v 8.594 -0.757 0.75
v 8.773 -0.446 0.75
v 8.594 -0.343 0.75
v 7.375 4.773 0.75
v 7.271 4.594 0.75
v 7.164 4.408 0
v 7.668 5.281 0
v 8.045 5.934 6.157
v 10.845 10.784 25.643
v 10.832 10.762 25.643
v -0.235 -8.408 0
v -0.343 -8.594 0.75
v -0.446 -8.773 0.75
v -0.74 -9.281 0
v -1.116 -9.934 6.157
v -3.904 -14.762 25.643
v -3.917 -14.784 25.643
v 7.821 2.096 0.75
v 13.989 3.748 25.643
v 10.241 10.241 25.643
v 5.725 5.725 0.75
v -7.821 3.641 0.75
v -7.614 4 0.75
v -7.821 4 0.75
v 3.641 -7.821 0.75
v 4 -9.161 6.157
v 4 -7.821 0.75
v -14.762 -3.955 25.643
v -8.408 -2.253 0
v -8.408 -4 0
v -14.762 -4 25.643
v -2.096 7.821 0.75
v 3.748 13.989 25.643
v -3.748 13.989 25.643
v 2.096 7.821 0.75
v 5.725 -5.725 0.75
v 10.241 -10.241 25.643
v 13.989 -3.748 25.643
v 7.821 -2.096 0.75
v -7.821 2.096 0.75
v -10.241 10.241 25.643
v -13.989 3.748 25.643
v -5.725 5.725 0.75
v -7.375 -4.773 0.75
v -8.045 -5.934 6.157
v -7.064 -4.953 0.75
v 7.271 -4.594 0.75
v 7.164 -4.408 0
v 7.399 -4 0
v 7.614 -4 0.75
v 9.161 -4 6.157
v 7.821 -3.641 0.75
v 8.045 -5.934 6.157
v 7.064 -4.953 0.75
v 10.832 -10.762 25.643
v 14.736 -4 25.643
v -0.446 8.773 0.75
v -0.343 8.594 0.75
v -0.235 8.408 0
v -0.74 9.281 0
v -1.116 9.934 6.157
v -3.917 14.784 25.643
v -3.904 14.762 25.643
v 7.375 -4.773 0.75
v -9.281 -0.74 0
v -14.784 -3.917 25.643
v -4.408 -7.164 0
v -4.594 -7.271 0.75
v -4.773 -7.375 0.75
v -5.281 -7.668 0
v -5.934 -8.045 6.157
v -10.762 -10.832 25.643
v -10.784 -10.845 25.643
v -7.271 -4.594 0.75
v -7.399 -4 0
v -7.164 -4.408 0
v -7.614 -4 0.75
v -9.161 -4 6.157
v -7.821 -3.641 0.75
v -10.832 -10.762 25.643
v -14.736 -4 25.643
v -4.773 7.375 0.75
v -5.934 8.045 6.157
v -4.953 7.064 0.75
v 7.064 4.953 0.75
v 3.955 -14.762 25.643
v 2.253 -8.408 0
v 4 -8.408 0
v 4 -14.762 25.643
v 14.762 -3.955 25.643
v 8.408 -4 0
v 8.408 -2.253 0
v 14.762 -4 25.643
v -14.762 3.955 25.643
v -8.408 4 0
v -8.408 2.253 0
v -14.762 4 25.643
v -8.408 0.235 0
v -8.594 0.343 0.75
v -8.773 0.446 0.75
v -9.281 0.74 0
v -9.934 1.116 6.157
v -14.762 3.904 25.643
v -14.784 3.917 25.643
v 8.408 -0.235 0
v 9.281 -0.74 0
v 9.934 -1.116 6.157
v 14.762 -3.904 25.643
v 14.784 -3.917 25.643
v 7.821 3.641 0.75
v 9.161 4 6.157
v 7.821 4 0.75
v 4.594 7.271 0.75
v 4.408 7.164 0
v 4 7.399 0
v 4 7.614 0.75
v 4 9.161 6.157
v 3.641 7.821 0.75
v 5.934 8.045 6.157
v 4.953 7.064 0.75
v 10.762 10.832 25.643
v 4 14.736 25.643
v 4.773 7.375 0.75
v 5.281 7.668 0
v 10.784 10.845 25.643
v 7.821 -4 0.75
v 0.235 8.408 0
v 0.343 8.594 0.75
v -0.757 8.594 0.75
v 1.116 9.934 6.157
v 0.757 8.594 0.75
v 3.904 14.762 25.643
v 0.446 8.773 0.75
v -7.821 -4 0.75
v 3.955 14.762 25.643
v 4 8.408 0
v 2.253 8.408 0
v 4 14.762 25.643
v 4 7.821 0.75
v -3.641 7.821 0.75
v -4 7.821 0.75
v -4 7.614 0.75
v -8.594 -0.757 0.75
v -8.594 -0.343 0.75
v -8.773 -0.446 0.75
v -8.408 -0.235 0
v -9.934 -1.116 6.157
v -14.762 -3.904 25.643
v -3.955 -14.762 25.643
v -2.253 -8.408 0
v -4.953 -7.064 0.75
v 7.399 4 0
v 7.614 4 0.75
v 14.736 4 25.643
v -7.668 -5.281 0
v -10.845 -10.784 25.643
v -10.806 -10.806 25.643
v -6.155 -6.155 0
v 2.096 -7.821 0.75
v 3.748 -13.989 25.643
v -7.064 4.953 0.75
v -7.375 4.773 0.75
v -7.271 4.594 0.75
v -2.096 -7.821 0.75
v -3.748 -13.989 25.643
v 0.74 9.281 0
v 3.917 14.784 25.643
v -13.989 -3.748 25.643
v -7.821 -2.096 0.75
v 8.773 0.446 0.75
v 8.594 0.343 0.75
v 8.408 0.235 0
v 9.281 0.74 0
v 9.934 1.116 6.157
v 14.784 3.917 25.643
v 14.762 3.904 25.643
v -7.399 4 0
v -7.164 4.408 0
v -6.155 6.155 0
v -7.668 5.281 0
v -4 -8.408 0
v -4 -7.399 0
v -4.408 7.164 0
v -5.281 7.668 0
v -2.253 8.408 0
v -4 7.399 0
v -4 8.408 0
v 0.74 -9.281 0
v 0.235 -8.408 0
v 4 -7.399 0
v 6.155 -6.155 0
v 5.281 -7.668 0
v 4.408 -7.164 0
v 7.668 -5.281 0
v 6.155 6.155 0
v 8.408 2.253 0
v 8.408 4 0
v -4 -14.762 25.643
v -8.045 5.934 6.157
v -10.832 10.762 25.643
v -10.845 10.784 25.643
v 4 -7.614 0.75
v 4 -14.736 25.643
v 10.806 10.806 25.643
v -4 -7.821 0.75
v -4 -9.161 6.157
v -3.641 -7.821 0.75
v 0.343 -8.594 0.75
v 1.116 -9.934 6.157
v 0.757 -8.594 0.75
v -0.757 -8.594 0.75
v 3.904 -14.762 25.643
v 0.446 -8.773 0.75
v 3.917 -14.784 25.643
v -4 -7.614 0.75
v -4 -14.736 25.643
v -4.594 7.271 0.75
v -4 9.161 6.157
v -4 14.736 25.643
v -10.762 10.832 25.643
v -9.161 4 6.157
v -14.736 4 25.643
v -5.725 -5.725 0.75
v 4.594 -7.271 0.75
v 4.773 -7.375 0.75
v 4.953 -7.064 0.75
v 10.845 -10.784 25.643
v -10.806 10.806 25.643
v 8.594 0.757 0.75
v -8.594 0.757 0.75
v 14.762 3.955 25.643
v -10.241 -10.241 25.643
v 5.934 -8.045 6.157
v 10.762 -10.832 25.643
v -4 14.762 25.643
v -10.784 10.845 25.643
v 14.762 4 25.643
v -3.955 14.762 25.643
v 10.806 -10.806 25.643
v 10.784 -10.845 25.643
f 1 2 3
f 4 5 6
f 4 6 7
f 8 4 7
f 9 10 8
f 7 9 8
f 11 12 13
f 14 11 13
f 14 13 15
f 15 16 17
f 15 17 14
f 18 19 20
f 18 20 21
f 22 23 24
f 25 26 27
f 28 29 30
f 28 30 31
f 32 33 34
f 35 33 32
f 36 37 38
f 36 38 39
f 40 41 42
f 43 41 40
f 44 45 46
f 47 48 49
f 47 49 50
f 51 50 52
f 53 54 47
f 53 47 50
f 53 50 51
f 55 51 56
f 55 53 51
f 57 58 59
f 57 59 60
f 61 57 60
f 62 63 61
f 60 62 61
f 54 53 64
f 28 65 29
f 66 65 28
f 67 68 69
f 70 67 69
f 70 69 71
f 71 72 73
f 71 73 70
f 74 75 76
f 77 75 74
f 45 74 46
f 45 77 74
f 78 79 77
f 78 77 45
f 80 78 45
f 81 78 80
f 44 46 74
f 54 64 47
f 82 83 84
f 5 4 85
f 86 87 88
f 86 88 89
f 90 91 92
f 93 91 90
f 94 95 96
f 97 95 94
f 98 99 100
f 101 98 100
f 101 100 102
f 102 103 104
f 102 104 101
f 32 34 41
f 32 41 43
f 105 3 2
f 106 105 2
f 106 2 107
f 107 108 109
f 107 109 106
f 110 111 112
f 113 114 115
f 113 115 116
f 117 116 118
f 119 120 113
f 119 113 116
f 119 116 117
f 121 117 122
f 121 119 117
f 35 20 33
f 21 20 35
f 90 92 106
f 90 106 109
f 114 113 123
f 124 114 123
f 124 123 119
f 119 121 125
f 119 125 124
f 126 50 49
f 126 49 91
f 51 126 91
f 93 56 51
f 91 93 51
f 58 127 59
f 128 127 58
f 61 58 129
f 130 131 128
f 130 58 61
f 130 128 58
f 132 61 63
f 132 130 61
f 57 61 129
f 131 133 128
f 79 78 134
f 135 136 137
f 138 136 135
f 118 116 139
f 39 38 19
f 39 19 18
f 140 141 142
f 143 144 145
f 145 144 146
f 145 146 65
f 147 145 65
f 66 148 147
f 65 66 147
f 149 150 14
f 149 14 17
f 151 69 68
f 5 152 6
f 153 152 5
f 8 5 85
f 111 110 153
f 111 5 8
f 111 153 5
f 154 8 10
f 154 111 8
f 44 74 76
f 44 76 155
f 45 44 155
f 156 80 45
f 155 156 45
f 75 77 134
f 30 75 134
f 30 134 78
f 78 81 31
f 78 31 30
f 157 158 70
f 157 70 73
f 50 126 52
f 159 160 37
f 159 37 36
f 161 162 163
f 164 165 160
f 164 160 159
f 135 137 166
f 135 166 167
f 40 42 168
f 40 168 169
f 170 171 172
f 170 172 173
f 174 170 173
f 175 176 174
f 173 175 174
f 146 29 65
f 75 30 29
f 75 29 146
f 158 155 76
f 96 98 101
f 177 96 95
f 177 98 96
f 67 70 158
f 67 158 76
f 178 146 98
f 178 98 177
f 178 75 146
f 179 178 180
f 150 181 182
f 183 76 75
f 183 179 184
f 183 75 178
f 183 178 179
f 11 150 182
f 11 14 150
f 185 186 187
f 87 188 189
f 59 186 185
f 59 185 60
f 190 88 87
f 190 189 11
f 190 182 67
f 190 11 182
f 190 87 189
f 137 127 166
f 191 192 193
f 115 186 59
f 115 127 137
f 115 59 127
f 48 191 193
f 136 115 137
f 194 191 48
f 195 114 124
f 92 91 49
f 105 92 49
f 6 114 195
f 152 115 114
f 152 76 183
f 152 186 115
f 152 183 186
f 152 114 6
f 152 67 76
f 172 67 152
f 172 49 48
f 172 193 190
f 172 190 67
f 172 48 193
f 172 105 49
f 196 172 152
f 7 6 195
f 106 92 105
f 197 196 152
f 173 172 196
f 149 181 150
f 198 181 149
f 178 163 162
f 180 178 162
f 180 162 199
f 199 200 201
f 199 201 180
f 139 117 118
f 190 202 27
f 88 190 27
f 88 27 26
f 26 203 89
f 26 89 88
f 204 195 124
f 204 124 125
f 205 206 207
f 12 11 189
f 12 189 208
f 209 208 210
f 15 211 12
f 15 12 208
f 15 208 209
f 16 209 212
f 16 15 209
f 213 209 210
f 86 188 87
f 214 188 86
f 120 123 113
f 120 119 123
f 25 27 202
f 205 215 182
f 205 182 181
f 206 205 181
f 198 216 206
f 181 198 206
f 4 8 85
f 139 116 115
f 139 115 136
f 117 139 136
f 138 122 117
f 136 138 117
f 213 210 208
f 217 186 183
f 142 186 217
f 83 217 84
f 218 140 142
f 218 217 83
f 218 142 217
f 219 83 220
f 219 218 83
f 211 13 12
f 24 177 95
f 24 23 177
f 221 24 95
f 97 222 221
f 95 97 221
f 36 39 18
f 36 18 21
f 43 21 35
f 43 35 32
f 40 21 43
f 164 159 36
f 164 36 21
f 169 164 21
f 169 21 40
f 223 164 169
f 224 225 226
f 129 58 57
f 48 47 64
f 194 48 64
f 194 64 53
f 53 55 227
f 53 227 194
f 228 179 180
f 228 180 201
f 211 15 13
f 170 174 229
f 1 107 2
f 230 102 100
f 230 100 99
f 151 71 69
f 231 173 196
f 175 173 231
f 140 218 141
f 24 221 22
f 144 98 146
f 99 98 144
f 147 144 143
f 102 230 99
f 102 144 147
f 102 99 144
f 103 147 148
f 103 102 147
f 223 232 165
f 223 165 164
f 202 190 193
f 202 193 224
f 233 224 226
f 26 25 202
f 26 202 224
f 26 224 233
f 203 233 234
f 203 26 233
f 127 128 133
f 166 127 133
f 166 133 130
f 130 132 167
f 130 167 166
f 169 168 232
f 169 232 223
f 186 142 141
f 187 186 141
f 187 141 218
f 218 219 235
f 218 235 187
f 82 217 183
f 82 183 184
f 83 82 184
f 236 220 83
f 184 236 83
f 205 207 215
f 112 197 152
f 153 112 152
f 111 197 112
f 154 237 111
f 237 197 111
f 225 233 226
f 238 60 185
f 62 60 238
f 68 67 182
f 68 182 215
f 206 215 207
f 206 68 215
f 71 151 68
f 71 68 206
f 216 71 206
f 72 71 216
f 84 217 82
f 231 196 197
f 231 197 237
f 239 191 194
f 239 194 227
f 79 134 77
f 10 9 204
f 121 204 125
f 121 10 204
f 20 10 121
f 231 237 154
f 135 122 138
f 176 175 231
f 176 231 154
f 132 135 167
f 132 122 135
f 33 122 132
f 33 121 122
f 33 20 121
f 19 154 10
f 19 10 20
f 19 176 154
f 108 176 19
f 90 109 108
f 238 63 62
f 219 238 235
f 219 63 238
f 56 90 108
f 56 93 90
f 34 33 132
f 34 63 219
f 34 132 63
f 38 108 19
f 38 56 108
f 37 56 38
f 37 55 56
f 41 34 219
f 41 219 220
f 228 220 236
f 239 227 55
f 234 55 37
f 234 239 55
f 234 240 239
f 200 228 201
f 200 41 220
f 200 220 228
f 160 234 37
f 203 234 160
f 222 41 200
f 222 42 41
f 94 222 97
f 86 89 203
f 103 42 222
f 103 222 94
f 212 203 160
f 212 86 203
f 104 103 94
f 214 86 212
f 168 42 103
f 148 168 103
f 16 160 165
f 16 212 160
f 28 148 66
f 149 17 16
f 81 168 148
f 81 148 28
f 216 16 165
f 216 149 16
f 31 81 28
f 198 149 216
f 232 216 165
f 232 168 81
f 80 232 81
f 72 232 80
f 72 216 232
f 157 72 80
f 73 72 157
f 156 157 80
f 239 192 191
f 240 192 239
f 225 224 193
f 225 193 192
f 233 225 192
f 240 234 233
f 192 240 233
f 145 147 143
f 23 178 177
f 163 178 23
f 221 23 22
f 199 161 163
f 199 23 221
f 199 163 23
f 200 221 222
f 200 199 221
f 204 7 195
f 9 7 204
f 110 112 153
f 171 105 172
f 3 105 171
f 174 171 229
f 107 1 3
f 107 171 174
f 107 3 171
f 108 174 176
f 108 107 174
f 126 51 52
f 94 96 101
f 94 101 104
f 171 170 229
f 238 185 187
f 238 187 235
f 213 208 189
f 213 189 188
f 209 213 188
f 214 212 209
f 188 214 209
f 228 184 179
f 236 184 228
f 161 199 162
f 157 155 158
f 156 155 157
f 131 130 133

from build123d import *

# Parameters (mm, degrees)
F1_DEPTH      = 4
F1_DEPTH_BACK = 4
F2_COUNT      = 12


with BuildPart() as f1:
    # F0 (on Front) → F1 (new body, two sides)
    with BuildSketch(Plane.XZ) as f1_sk:
        Polygon((0, 0.75), (0, 0), (8.40777345, 0), (14.7618511692, 25.6429929286), (13.9891691904, 25.6429929286), (7.8209339859, 0.75), (7.5633733264, 0.75), (7.3573247987, 0.75), align=None)
    extrude(amount=F1_DEPTH)
    extrude(f1_sk.sketch, amount=-F1_DEPTH_BACK)

    # F2: F1 ×12 about axis
    f2_axis = Axis((0, 0, 1.0500000276), (0, 0, -1))


with BuildPart() as f1_1:
    add(f1.part)
    for i in range(1, F2_COUNT):
        add(f1.part.rotate(f2_axis, i * 360 / F2_COUNT))


solid = f1_1.part
